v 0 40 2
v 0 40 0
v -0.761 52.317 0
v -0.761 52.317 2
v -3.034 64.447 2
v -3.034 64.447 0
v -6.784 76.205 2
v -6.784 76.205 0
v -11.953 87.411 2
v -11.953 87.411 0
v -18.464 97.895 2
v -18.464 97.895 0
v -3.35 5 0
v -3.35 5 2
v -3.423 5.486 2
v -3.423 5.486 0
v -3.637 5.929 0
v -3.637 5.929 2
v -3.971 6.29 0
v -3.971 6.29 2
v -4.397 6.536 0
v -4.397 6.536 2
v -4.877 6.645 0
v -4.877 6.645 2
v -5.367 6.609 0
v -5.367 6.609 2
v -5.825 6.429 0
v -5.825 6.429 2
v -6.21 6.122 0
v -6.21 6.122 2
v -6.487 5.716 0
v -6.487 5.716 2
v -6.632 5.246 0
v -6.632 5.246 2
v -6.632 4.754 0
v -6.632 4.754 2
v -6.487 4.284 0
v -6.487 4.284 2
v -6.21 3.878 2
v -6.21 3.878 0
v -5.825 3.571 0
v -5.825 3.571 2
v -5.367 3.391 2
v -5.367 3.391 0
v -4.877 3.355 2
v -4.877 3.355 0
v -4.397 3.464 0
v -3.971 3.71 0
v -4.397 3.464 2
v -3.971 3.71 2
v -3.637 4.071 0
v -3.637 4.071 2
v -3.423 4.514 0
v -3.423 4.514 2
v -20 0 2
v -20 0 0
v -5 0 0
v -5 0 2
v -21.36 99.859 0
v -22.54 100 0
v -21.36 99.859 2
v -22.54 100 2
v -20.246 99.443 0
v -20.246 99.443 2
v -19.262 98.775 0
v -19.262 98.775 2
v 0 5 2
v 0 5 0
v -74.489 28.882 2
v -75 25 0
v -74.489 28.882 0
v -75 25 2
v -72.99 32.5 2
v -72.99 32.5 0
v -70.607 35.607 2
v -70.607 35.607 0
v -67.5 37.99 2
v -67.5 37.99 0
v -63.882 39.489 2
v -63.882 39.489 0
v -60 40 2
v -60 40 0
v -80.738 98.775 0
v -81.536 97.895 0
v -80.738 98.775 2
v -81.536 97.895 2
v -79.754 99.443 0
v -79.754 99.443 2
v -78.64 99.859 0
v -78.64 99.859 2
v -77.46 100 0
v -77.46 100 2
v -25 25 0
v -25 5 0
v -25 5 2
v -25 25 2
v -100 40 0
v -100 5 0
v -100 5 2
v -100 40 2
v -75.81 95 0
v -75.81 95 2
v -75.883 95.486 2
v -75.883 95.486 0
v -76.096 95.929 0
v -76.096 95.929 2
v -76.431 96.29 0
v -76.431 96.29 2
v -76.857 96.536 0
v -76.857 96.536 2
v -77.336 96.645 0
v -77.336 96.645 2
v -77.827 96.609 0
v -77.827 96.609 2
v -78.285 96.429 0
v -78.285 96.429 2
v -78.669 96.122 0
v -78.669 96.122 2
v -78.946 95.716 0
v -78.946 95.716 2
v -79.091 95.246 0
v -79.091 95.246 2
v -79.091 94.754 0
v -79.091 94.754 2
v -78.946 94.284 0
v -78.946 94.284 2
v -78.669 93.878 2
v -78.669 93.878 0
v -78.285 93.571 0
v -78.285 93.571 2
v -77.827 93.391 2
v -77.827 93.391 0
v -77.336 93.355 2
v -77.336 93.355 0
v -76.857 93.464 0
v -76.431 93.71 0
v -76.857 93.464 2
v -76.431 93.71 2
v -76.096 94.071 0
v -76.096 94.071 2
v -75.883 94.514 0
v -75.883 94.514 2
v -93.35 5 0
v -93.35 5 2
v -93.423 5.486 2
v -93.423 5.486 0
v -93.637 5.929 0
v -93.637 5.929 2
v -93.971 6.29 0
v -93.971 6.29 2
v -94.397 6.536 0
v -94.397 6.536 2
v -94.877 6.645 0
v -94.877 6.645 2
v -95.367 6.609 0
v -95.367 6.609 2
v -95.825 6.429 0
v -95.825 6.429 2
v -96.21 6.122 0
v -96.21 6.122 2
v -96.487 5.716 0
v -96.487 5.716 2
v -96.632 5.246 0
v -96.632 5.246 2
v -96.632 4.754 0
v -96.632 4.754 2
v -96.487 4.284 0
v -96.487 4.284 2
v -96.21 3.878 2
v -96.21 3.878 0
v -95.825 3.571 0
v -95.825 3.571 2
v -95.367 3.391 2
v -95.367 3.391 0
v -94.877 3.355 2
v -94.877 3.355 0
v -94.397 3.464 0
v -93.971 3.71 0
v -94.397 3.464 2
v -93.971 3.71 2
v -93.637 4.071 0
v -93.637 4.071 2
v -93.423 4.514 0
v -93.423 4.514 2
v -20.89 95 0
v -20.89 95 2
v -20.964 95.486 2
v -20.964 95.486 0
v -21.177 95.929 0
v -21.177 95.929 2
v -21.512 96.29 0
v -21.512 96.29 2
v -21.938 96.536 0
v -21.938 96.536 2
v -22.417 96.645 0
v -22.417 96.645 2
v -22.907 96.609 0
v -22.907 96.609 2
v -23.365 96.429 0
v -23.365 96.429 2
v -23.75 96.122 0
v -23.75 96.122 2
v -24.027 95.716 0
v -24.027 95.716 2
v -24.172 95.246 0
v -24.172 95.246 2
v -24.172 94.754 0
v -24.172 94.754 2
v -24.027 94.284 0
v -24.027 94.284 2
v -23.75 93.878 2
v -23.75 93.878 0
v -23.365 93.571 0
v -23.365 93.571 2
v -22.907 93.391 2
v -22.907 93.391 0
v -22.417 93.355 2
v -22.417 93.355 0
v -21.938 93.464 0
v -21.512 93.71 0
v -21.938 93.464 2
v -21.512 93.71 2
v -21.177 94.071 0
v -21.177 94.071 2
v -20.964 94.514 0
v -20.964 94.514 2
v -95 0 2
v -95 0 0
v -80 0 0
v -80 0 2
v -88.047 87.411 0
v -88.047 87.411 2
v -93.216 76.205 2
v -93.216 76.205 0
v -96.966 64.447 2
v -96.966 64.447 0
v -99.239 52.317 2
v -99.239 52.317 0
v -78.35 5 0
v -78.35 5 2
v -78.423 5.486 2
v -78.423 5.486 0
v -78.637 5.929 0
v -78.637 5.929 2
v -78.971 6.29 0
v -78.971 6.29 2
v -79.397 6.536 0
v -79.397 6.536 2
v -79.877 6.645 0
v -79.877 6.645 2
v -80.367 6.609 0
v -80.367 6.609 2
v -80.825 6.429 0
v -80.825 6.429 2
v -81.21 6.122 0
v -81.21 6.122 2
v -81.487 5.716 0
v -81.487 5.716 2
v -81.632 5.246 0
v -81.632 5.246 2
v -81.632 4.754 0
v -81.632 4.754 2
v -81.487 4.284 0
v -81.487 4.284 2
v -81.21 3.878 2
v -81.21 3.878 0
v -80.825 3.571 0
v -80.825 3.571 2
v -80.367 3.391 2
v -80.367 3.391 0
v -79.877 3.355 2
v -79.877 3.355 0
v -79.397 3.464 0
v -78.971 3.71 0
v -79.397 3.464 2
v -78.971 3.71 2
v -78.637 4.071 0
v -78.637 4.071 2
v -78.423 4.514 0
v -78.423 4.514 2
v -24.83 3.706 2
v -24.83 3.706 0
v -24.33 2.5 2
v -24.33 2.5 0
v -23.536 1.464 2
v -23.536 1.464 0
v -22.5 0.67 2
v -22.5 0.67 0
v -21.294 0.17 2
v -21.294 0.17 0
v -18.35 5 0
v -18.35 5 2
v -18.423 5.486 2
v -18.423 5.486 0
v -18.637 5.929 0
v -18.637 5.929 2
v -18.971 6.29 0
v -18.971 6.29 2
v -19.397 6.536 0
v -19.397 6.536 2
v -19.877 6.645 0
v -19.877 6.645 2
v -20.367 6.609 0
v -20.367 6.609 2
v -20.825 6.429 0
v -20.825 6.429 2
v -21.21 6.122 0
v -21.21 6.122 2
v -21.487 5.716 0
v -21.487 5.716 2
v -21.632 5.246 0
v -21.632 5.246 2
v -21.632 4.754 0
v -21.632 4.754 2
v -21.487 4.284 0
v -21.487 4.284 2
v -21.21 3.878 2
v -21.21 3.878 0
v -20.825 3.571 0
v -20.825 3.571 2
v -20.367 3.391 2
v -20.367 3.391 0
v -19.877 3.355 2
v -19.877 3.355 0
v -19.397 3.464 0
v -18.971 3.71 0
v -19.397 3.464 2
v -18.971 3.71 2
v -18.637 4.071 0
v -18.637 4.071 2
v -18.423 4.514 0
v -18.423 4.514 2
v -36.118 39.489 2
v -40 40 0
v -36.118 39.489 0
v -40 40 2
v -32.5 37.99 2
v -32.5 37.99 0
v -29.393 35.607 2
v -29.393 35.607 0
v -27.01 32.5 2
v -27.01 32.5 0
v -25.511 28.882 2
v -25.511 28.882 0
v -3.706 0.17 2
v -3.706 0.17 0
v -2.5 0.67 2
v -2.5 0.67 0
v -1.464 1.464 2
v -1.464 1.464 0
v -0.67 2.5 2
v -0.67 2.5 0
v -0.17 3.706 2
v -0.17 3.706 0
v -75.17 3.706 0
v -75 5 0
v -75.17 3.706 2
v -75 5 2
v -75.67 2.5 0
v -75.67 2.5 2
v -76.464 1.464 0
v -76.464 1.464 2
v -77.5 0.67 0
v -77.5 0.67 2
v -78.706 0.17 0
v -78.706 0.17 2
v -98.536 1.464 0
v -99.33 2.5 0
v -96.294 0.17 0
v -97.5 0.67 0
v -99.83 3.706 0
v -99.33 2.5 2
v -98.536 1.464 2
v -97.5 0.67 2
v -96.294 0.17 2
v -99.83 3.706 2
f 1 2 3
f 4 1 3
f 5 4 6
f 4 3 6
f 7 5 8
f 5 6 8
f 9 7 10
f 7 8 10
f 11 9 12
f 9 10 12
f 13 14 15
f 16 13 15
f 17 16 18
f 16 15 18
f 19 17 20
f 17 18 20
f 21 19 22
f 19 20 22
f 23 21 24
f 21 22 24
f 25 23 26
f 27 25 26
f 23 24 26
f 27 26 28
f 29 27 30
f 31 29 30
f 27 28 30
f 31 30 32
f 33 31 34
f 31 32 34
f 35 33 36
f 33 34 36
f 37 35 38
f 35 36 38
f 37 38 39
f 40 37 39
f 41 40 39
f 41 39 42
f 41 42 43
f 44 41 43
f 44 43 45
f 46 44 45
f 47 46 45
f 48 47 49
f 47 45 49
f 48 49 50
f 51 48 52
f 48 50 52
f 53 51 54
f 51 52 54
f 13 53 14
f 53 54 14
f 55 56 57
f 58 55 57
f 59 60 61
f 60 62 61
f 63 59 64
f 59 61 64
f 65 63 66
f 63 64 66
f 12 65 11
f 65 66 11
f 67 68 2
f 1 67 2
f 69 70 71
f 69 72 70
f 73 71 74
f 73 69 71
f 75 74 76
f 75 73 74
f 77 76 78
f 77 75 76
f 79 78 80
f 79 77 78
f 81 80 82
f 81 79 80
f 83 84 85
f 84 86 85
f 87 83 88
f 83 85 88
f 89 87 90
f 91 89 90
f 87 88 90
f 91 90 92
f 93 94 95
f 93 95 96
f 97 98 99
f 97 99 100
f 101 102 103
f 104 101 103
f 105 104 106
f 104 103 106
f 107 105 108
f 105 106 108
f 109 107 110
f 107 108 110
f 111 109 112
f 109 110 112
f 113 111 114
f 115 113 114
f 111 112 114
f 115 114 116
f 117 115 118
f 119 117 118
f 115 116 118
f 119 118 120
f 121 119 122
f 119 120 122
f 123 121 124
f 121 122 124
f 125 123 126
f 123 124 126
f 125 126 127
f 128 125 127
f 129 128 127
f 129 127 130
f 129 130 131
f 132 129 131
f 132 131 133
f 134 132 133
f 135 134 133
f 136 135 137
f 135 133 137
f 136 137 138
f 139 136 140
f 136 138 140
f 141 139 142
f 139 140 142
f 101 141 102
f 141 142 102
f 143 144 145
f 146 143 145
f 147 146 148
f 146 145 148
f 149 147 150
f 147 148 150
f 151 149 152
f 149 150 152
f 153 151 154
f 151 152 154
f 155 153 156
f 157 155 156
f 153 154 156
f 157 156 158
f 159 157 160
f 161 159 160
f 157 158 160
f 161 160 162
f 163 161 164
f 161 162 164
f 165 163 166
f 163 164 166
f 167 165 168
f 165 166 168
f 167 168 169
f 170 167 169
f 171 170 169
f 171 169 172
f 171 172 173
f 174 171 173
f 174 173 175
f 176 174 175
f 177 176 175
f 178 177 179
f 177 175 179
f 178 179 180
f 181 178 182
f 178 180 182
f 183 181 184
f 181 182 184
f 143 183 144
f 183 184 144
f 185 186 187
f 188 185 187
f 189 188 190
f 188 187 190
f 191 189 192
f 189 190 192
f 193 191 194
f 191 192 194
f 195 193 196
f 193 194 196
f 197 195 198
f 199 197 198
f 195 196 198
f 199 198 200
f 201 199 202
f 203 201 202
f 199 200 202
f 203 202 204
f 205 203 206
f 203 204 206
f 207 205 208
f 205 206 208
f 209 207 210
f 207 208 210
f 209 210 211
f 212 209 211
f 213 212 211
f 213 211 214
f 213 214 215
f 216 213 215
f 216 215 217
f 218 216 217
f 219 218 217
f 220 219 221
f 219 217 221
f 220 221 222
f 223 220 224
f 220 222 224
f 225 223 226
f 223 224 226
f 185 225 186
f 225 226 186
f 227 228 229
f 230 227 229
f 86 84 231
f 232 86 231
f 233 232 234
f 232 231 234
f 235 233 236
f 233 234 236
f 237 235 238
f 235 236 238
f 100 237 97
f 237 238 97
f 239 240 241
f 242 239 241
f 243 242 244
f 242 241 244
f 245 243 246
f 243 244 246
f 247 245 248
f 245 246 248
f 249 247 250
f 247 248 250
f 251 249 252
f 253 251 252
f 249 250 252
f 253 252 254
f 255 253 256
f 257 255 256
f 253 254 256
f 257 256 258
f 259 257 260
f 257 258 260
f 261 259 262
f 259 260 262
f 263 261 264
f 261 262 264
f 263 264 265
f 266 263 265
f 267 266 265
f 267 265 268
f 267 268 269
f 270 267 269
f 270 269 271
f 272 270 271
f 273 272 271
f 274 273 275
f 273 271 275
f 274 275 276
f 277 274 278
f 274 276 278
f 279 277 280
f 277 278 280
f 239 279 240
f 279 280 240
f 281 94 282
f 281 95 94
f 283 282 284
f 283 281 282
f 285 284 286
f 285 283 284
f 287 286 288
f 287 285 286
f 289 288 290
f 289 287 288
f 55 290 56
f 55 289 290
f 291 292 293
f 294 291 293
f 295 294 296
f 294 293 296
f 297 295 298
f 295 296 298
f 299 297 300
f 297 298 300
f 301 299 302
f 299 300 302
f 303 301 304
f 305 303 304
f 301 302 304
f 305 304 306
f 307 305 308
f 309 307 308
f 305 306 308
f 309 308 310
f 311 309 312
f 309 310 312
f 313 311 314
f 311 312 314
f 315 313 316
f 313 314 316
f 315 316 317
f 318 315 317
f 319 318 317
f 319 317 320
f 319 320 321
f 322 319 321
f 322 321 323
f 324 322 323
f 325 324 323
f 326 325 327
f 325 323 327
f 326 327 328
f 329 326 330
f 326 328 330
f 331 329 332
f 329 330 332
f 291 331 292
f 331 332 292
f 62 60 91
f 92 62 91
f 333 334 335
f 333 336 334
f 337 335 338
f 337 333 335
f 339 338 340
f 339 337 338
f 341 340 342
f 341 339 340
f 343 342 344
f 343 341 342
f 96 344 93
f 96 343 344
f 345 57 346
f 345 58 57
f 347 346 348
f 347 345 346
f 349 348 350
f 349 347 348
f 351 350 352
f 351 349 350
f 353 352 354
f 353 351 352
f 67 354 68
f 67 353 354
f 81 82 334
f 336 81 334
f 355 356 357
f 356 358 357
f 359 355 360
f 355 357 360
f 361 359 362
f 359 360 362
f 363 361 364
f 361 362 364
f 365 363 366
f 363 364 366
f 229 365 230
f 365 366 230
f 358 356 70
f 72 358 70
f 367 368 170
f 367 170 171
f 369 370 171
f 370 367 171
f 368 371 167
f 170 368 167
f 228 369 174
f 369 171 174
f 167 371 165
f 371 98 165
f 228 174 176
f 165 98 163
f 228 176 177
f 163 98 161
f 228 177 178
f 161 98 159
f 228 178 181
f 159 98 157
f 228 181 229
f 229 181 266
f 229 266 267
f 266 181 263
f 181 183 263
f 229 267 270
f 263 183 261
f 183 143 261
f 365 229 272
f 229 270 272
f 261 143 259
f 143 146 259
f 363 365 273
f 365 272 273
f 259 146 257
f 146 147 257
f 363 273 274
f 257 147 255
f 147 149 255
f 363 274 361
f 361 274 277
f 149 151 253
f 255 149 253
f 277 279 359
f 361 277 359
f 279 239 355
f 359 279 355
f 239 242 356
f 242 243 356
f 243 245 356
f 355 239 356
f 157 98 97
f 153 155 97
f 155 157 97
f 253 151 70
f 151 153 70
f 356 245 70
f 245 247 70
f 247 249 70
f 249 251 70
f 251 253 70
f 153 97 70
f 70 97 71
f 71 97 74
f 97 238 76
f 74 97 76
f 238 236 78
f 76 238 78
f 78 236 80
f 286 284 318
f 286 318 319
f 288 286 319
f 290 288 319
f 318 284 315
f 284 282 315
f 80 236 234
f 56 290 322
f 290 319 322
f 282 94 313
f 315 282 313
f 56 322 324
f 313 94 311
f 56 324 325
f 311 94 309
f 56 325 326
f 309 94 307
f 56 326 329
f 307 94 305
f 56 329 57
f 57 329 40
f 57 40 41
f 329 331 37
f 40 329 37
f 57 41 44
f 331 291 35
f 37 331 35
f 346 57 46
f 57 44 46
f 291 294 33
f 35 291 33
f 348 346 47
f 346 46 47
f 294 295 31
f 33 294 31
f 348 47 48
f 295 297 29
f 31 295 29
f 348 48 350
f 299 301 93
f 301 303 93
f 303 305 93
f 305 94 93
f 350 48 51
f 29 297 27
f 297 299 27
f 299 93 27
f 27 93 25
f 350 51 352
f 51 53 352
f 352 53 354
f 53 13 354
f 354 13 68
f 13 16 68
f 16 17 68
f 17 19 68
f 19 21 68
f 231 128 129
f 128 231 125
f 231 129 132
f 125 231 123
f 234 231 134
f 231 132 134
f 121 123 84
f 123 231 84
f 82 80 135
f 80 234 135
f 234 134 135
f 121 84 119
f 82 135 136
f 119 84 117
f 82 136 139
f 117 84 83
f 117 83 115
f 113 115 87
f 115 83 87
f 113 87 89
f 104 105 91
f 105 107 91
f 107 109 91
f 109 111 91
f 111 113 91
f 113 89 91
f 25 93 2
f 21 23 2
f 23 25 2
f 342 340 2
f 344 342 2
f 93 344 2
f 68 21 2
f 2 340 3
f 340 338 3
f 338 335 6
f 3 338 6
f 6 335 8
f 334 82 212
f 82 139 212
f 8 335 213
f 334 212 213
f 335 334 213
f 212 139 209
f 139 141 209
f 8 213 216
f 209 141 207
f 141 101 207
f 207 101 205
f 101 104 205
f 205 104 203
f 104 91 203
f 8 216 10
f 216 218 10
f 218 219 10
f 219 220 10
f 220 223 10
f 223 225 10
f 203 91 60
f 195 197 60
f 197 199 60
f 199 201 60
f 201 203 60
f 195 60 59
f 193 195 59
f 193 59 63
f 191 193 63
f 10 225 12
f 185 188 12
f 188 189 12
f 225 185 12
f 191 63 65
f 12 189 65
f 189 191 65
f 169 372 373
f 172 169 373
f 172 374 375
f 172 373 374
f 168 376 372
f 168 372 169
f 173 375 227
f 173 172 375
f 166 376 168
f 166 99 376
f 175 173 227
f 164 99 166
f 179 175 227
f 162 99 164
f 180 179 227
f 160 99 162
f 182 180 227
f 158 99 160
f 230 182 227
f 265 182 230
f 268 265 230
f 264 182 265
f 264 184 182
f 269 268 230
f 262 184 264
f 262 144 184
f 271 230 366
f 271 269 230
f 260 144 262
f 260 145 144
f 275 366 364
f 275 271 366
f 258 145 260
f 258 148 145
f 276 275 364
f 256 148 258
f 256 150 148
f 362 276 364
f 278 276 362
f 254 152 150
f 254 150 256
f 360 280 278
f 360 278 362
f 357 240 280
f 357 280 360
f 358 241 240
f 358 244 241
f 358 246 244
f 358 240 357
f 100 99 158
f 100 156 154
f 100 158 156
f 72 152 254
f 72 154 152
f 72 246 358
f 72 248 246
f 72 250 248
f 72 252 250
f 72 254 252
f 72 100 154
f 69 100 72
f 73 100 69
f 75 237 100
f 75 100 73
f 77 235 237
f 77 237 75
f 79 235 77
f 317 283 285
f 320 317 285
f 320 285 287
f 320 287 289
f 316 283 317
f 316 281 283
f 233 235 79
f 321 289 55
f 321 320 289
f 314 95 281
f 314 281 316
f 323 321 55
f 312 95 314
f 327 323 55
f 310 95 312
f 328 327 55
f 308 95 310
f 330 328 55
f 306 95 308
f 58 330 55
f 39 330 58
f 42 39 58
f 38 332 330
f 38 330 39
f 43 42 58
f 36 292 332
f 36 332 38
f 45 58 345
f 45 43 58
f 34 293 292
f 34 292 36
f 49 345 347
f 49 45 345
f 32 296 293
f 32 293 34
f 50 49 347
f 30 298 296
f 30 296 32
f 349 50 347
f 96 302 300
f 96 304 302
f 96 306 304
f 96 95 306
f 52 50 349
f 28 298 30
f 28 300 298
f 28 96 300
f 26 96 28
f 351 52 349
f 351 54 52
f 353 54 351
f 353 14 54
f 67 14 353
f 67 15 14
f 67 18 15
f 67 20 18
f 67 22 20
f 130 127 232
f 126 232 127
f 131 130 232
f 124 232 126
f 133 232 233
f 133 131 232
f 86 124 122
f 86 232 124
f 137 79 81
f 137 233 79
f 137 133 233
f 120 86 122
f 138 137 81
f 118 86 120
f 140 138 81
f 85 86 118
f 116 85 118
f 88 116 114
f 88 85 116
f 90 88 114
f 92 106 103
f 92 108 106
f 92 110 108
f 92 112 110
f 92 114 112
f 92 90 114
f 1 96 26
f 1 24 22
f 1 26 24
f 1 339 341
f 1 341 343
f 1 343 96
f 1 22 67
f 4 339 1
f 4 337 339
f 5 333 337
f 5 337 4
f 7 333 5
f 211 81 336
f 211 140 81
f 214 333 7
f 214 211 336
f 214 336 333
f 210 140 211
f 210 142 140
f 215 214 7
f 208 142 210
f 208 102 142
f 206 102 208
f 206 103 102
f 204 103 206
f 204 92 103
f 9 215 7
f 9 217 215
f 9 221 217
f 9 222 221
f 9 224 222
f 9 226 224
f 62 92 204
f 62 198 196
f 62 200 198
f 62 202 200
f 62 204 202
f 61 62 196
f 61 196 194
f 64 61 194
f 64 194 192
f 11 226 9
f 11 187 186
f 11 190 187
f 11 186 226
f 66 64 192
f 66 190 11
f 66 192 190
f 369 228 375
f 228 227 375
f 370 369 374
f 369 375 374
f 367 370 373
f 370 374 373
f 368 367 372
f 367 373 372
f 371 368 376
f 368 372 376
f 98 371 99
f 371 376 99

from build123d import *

# Parameters (mm, degrees)
SKETCH_1_W          = 25
SKETCH_1_H          = 40
EXTRUDE_1_DEPTH     = 2
FILLET_1_R          = 15
FILLET_2_R          = 5
FILLET_3_R          = 5
SKETCH_2_R          = 1.65
CUT_EXTRUDE_2_DEPTH = 2


with BuildPart() as part:
    # 草图1 → 凸台-拉伸1 (new body)
    with BuildSketch(Plane.XY):
        with BuildLine():
            Line((-25, 40), (0, 40))
            ThreePointArc((0, 40), (-5.131670195, 71.622776602), (-20, 100))
            Line((-20, 100), (-80, 100))
            ThreePointArc((-80, 100), (-94.868329805, 71.622776602), (-100, 40))
            Line((-100, 40), (-75, 40))
            Line((-75, 40), (-25, 40))
        make_face()
        with Locations((-87.5, 20)):
            Rectangle(SKETCH_1_W, SKETCH_1_H)
        with Locations((-12.5, 20)):
            Rectangle(SKETCH_1_W, SKETCH_1_H)
    extrude(amount=EXTRUDE_1_DEPTH)

    # 圆角1
    fillet_1_edges = [part.edges().sort_by_distance(p)[0] for p in [
        (-75, 40, 1),
        (-25, 40, 1),
    ]]
    fillet(fillet_1_edges, radius=FILLET_1_R)

    # 圆角2
    fillet_2_edges = [part.edges().sort_by_distance(p)[0] for p in [
        (-75, 0, 1),
        (-100, 0, 1),
        (0, 0, 1),
        (-25, 0, 1),
    ]]
    fillet(fillet_2_edges, radius=FILLET_2_R)

    # 圆角3
    fillet_3_edges = [part.edges().sort_by_distance(p)[0] for p in [
        (-80, 100, 1),
        (-20, 100, 1),
    ]]
    fillet(fillet_3_edges, radius=FILLET_3_R)

    # 草图2 → 切除-拉伸2 (cut)
    with BuildSketch(Plane.XY.offset(2)):
        with Locations((-77.459666924, 95)):
            Circle(SKETCH_2_R)
        with Locations((-22.540333076, 95)):
            Circle(SKETCH_2_R)
        with Locations((-95, 5)):
            Circle(SKETCH_2_R)
        with Locations((-5, 5)):
            Circle(SKETCH_2_R)
        with Locations((-80, 5)):
            Circle(SKETCH_2_R)
        with Locations((-20, 5)):
            Circle(SKETCH_2_R)
    extrude(amount=-CUT_EXTRUDE_2_DEPTH, mode=Mode.SUBTRACT)


solid = part.part
